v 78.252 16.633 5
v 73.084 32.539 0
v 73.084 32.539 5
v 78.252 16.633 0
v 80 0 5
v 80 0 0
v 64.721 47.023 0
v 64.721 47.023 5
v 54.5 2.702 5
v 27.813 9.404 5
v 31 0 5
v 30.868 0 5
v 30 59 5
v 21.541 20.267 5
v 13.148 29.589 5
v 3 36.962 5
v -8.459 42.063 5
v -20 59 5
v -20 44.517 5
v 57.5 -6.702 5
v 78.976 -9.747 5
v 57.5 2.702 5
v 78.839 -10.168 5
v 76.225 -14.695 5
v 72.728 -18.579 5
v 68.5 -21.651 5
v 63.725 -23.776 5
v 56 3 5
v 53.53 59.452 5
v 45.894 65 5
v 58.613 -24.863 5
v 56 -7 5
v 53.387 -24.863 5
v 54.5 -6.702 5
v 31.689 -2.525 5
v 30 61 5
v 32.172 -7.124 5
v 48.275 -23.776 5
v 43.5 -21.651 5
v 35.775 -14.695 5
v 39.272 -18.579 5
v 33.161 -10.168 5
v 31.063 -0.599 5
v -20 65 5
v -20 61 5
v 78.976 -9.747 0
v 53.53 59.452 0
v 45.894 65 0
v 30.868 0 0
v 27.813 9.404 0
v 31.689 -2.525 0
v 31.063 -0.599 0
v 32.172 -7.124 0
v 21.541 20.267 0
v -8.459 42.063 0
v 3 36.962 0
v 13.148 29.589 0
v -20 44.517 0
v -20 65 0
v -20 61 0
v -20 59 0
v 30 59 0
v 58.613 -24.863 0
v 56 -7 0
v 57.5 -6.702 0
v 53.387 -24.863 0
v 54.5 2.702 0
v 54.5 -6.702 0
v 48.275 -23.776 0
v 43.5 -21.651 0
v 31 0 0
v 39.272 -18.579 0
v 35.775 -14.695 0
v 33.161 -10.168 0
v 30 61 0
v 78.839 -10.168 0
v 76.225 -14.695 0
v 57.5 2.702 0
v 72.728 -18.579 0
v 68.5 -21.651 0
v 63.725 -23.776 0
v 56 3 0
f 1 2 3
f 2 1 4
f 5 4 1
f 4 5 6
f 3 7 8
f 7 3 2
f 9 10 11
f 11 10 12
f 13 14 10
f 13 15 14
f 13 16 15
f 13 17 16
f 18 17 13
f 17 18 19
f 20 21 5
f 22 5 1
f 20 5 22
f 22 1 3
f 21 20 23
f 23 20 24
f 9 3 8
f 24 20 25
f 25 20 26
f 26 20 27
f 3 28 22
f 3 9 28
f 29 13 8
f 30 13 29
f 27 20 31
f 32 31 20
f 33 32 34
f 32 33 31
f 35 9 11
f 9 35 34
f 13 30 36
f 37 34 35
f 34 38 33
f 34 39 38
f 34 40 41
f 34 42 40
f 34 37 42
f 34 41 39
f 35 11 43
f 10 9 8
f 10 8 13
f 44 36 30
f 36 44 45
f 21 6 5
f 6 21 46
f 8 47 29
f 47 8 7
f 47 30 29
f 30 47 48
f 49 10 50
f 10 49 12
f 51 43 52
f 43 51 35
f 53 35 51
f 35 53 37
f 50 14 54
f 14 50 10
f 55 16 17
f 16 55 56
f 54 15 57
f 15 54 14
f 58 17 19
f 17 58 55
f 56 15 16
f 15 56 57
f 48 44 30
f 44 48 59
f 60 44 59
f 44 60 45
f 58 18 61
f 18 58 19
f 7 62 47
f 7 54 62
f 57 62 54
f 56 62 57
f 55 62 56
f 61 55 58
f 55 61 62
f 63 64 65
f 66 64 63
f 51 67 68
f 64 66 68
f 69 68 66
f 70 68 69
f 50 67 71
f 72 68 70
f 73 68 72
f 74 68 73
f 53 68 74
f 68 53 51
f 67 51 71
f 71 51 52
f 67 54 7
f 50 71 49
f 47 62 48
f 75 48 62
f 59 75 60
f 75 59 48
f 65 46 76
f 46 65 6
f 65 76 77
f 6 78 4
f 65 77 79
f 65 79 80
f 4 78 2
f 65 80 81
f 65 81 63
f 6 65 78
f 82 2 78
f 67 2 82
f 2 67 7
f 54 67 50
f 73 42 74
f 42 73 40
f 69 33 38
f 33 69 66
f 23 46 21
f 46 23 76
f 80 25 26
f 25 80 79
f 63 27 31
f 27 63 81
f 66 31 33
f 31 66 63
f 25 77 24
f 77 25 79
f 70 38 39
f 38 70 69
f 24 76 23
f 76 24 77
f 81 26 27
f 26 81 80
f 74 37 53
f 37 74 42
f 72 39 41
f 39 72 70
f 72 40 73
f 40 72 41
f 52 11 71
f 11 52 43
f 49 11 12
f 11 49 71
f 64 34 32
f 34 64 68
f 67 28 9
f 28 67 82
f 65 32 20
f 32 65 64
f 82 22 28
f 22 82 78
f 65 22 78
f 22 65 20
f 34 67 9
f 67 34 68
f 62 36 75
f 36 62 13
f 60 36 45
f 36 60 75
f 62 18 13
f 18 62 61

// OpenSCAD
mm =1;//scale of the design
ht = 10*mm;//handle thickness


module axis_1(){//28BYJ-48-08 stepper axis
    intersection(){
        rotate(90, [0,1,0]) cylinder(h=ht*2,r=5, center=true);
        cube([ht*2, ht*2, 3], center=true);
    }
}

//overcomplicated, but it works
module handle(){
    difference(){
        intersection(){
            difference(){
                cylinder(h=ht, r=80*mm, center=true);
                translate([-27*mm,-15*mm,0]) cylinder(h=ht*2, r=60*mm, center=true);
                translate([-40*mm,75*mm,0]) cube([200*mm,20*mm,200*mm], center=true);
                translate([-70*mm,40*mm,0]) cube([100*mm,100*mm,ht*2], center=true);
            }
            union(){
                translate([56*mm,0*mm,0]) cylinder(h=ht*2,r=25*mm);
                translate([-40*mm,0*mm,0]) cube([200*mm,100*mm,ht*2]);
            }
        }
        translate([-20,60,0]) cube([100,2,ht*2], center=true);
        
        //Change this line to change the axis hole
        translate([56*mm,-2*mm,0]) rotate(90, [0,1,0]) axis_1();
    }
}

handle();
